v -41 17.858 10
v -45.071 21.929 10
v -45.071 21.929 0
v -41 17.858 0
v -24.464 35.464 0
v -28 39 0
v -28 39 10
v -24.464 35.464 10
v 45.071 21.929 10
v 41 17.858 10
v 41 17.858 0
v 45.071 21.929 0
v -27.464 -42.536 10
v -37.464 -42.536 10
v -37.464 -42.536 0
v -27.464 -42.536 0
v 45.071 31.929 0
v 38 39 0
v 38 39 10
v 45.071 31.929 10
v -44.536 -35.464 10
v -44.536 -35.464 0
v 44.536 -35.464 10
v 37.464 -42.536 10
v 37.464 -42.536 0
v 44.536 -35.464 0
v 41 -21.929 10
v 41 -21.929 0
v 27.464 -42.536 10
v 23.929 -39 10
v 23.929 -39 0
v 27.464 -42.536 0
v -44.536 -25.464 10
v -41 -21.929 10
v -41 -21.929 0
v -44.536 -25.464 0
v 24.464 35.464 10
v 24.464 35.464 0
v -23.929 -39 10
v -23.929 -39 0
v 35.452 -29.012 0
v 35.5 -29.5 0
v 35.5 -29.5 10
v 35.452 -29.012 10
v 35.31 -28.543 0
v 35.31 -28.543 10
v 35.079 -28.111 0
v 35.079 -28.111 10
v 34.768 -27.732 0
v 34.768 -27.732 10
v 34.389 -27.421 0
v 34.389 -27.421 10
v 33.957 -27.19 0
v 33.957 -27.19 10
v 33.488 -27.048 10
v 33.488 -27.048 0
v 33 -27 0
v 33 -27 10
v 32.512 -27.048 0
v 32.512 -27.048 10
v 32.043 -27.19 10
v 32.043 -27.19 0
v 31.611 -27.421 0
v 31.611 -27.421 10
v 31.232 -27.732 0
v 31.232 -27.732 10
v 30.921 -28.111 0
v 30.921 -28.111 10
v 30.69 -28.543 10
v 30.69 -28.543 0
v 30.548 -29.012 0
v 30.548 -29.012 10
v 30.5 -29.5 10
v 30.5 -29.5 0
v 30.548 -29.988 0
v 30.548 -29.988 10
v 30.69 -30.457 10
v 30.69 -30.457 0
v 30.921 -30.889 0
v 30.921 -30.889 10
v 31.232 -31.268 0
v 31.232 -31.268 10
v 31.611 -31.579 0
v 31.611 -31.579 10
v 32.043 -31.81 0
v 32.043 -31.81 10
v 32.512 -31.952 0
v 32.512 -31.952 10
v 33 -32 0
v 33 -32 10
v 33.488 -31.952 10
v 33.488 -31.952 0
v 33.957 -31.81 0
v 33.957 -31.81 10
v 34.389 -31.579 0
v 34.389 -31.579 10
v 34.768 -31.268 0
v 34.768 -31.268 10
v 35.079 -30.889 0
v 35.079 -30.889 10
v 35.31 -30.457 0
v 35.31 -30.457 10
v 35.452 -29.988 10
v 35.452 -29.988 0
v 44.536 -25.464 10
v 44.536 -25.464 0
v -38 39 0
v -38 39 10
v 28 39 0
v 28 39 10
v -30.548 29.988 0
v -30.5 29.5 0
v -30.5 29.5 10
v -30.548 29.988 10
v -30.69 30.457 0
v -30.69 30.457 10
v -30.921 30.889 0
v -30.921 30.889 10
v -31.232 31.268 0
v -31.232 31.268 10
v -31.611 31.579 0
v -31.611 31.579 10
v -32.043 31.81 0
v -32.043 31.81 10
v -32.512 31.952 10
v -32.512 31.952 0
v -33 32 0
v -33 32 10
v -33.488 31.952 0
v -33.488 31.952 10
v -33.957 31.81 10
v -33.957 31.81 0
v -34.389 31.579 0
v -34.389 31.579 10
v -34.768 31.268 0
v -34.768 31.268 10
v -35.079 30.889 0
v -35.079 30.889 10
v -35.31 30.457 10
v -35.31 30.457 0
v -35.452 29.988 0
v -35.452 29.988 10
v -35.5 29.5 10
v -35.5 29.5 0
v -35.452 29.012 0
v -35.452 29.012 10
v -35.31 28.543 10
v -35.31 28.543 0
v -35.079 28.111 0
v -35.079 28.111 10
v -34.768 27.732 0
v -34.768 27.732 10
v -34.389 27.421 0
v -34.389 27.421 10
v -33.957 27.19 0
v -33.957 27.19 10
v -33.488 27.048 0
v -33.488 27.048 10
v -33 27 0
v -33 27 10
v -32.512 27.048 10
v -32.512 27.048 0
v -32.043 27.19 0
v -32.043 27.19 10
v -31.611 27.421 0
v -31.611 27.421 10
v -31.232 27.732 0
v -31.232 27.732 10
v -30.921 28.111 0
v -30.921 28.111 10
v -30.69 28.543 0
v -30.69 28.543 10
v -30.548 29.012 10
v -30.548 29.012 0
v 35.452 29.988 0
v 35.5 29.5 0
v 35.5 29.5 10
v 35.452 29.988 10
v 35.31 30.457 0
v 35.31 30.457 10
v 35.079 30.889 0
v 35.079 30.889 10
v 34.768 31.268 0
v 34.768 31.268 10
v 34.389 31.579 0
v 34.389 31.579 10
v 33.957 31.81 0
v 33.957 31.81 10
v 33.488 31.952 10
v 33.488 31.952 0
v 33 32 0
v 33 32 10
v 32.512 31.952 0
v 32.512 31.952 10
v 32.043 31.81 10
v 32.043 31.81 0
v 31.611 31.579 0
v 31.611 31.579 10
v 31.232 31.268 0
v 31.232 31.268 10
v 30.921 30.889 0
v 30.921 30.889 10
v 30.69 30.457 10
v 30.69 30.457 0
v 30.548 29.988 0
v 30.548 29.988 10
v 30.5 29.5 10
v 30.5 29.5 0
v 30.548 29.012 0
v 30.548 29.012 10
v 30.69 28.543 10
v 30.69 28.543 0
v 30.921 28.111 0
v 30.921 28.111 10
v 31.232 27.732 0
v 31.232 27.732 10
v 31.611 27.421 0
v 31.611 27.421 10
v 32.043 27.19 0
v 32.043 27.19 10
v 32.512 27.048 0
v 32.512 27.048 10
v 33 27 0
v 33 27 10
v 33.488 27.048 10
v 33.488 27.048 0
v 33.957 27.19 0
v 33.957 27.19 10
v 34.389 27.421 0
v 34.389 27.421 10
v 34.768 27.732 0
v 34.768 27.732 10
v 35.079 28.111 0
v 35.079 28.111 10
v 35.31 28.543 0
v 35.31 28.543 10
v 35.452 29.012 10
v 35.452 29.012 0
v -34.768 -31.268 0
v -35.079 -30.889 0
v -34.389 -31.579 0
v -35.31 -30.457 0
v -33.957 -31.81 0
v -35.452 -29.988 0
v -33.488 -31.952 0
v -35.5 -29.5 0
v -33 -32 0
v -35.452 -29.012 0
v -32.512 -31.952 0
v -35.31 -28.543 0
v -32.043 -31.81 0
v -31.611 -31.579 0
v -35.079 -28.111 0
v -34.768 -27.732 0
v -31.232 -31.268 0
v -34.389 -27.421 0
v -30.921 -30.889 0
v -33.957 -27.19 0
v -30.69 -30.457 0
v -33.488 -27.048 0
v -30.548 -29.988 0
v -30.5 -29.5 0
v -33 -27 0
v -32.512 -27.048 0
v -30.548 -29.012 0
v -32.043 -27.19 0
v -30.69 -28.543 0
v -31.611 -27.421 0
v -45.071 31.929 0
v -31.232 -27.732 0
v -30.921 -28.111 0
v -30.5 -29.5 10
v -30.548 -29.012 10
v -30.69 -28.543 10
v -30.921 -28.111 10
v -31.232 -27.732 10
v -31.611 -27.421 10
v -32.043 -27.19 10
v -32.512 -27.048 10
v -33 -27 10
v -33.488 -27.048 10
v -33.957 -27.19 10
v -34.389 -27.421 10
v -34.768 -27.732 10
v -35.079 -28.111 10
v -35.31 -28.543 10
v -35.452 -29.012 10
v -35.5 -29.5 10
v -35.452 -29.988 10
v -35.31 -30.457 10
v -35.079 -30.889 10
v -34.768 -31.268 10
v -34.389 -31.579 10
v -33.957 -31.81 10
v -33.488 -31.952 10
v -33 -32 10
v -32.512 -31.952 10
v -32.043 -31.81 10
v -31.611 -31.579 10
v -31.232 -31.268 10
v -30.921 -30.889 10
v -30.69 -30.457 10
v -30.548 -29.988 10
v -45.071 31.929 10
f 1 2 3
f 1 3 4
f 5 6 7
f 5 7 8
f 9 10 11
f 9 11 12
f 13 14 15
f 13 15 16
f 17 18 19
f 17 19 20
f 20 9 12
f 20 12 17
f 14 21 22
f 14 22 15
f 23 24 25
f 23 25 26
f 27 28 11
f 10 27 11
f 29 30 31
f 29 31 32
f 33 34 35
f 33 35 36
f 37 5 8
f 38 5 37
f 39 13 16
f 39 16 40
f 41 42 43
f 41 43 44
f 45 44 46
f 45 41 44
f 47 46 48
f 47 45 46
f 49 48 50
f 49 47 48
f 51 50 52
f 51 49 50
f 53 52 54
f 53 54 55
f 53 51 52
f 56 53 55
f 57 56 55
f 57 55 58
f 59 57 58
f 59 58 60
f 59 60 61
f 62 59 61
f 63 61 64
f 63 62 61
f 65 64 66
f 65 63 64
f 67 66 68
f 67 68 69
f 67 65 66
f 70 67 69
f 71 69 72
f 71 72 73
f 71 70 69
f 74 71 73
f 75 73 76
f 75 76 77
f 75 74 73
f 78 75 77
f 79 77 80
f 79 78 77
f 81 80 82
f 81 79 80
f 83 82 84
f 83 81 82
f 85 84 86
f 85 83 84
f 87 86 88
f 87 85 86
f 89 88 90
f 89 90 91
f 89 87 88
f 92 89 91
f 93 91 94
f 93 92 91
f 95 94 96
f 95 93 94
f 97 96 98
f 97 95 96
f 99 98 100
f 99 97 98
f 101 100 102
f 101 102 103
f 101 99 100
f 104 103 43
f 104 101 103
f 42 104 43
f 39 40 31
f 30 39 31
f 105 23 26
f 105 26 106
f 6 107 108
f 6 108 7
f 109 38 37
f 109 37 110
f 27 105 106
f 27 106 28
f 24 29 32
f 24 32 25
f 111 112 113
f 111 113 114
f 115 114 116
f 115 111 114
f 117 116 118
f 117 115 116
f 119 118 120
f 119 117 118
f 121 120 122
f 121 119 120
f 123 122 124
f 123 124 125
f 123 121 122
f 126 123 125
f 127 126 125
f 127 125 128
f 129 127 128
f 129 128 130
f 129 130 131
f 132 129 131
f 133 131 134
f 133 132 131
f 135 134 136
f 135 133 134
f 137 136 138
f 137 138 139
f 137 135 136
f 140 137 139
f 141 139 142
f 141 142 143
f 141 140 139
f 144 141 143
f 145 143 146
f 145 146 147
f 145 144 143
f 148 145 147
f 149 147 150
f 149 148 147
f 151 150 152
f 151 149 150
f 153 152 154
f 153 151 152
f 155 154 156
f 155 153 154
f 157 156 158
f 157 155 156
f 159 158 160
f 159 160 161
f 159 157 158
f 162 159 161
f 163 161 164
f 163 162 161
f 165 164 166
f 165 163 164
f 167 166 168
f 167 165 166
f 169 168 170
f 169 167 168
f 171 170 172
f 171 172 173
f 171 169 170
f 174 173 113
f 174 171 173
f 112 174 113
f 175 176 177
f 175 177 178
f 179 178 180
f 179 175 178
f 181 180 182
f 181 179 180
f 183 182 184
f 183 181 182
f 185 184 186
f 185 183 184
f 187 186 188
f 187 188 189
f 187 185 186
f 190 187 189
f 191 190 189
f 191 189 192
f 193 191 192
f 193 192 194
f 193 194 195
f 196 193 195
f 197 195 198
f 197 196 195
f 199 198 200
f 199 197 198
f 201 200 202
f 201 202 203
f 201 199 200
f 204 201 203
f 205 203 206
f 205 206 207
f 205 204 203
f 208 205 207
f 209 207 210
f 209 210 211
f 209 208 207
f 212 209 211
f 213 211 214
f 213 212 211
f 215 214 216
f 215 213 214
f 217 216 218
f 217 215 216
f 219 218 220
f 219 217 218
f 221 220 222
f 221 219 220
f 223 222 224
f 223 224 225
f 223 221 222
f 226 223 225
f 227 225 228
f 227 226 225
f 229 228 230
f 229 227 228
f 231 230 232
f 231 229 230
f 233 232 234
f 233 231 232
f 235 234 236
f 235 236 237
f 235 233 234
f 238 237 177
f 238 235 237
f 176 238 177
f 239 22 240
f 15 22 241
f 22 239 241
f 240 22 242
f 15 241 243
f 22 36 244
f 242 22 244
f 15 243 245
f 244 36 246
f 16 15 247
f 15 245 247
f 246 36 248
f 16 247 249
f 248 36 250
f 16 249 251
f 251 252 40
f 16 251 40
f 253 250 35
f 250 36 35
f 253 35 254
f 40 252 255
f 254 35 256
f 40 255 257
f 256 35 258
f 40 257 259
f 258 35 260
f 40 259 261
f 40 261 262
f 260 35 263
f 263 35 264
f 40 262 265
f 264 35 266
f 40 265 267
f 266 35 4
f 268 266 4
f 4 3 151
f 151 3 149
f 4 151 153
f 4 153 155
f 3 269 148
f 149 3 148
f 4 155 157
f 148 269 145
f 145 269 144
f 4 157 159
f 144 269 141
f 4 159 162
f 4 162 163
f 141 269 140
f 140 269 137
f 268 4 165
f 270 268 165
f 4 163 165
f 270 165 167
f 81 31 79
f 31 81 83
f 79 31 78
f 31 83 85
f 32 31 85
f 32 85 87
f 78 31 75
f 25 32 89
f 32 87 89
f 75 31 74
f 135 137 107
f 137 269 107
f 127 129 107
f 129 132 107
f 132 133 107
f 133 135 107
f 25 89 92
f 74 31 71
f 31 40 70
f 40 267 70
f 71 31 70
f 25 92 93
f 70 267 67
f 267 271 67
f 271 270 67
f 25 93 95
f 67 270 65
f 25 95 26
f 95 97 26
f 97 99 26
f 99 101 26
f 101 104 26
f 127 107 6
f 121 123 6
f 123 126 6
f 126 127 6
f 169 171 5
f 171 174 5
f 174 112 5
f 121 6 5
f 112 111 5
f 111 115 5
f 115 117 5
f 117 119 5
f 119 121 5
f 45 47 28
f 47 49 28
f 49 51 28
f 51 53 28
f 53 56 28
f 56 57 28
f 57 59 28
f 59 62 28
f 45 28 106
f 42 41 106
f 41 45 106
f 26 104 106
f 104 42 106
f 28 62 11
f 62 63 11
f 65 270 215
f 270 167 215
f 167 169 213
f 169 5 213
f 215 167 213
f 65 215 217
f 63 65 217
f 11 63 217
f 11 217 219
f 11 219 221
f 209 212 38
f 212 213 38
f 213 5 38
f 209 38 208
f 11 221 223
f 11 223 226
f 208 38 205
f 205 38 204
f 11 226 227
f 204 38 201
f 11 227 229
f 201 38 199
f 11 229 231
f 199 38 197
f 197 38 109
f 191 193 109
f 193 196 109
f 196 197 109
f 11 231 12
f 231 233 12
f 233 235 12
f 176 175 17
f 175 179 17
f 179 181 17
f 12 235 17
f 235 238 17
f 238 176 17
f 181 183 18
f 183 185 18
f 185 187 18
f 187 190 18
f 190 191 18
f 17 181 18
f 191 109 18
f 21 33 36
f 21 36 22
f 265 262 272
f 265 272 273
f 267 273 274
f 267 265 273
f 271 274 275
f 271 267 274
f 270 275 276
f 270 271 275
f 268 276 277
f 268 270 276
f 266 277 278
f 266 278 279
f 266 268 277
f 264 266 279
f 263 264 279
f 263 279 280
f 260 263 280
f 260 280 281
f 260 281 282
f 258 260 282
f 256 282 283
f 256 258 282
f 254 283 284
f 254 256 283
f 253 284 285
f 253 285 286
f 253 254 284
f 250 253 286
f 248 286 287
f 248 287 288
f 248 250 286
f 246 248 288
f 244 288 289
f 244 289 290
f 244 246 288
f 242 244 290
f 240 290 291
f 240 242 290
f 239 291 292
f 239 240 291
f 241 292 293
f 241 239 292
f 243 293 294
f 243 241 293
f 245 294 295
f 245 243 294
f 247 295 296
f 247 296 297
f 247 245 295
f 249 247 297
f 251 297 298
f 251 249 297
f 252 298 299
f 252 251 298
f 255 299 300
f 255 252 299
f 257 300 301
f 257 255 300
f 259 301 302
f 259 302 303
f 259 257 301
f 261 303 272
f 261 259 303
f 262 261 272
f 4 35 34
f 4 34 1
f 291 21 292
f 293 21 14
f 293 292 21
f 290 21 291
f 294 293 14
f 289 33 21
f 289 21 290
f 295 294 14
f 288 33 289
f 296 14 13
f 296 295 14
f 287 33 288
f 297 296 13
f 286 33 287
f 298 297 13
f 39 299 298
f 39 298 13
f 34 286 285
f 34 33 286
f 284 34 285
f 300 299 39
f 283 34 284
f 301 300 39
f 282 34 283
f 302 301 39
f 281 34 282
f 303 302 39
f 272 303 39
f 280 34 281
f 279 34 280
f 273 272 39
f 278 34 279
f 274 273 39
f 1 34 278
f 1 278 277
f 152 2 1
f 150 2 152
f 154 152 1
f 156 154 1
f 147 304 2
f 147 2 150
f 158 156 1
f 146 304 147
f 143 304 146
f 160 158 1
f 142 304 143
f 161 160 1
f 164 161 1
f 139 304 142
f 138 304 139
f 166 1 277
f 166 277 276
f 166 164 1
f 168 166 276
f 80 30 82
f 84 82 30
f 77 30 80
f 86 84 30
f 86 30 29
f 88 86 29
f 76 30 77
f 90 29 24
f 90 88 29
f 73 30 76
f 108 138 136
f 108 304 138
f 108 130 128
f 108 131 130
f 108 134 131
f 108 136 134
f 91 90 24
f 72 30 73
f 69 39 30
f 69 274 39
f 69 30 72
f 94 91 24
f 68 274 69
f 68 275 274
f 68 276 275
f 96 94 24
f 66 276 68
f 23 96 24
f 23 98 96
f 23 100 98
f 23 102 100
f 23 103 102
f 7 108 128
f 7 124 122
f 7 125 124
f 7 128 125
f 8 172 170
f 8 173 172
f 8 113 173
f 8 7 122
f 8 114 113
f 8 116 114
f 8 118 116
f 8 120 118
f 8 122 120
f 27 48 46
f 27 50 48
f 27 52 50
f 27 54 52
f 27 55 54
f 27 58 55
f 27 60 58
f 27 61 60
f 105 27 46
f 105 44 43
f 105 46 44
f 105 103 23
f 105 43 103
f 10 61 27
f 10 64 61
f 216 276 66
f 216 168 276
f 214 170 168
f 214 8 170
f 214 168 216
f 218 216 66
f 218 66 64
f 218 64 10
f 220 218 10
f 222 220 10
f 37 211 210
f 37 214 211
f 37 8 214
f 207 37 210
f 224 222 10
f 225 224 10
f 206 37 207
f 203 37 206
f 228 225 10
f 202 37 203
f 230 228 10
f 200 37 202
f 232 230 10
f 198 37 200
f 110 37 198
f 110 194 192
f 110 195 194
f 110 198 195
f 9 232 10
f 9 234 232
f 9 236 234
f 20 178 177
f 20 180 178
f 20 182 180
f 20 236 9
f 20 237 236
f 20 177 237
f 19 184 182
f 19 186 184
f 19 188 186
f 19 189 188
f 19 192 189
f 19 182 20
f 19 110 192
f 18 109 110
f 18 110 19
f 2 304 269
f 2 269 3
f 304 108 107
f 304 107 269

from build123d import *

# Parameters (mm, degrees)
CROQUIS1_W                   = 82
CROQUIS1_H                   = 78
CROQUIS1_R                   = 2.5
SALIENTE_EXTRUIR5_DEPTH      = 10
SALIENTE_EXTRUIR7_DEPTH      = 10
CORTAR_EXTRUIR_L_MINA1_START = -10
CORTAR_EXTRUIR_L_MINA1_DEPTH = 10


# Read off the part's stored shape, not the designer's step: Cortar-Extruir-Lámina1
with BuildPart() as part:
    # Croquis1 → Saliente-Extruir5 (new body)
    with BuildSketch(Plane.XY):
        Rectangle(CROQUIS1_W, CROQUIS1_H)
        with Locations((-33, 29.5)):
            Circle(CROQUIS1_R, mode=Mode.SUBTRACT)
        with Locations((33, 29.5)):
            Circle(CROQUIS1_R, mode=Mode.SUBTRACT)
        with Locations((33, -29.5)):
            Circle(CROQUIS1_R, mode=Mode.SUBTRACT)
        with Locations((-33, -29.5)):
            Circle(CROQUIS1_R, mode=Mode.SUBTRACT)
    extrude(amount=SALIENTE_EXTRUIR5_DEPTH)

    # Croquis6 → Saliente-Extruir7 (add, through all)
    with BuildSketch(Plane.XY.offset(10)):
        Polygon((-41, 17.857864376), (-41, 36), (-45.071067812, 31.928932188), (-45.071067812, 21.928932188), align=None)
        Polygon((45.071067812, 31.928932188), (41, 36), (41, 17.857864376), (45.071067812, 21.928932188), align=None)
        Polygon((-41, -39), (-41, -21.928932188), (-44.535533906, -25.464466094), (-44.535533906, -35.464466094), align=None)
        Polygon((44.535533906, -25.464466094), (41, -21.928932188), (41, -39), (44.535533906, -35.464466094), align=None)
        Polygon((-23.928932188, -39), (-41, -39), (-37.464466094, -42.535533906), (-27.464466094, -42.535533906), align=None)
        Polygon((37.464466094, -42.535533906), (41, -39), (23.928932188, -39), (27.464466094, -42.535533906), align=None)
    extrude(amount=-SALIENTE_EXTRUIR7_DEPTH)

    # Cortar-Extruir-Lámina1 outline → Cortar-Extruir-Lámina1 (cut)
    with BuildSketch(Plane.XY.offset(10).offset(CORTAR_EXTRUIR_L_MINA1_START)):
        Polygon((41, 39), (38, 39), (41, 36), align=None)
        Polygon((28, 39), (-28, 39), (-24.464466094, 35.464466094), (24.464466094, 35.464466094), align=None)
        Polygon((-41, 36), (-38, 39), (-41, 39), align=None)
    extrude(amount=CORTAR_EXTRUIR_L_MINA1_DEPTH, mode=Mode.SUBTRACT)


solid = part.part
